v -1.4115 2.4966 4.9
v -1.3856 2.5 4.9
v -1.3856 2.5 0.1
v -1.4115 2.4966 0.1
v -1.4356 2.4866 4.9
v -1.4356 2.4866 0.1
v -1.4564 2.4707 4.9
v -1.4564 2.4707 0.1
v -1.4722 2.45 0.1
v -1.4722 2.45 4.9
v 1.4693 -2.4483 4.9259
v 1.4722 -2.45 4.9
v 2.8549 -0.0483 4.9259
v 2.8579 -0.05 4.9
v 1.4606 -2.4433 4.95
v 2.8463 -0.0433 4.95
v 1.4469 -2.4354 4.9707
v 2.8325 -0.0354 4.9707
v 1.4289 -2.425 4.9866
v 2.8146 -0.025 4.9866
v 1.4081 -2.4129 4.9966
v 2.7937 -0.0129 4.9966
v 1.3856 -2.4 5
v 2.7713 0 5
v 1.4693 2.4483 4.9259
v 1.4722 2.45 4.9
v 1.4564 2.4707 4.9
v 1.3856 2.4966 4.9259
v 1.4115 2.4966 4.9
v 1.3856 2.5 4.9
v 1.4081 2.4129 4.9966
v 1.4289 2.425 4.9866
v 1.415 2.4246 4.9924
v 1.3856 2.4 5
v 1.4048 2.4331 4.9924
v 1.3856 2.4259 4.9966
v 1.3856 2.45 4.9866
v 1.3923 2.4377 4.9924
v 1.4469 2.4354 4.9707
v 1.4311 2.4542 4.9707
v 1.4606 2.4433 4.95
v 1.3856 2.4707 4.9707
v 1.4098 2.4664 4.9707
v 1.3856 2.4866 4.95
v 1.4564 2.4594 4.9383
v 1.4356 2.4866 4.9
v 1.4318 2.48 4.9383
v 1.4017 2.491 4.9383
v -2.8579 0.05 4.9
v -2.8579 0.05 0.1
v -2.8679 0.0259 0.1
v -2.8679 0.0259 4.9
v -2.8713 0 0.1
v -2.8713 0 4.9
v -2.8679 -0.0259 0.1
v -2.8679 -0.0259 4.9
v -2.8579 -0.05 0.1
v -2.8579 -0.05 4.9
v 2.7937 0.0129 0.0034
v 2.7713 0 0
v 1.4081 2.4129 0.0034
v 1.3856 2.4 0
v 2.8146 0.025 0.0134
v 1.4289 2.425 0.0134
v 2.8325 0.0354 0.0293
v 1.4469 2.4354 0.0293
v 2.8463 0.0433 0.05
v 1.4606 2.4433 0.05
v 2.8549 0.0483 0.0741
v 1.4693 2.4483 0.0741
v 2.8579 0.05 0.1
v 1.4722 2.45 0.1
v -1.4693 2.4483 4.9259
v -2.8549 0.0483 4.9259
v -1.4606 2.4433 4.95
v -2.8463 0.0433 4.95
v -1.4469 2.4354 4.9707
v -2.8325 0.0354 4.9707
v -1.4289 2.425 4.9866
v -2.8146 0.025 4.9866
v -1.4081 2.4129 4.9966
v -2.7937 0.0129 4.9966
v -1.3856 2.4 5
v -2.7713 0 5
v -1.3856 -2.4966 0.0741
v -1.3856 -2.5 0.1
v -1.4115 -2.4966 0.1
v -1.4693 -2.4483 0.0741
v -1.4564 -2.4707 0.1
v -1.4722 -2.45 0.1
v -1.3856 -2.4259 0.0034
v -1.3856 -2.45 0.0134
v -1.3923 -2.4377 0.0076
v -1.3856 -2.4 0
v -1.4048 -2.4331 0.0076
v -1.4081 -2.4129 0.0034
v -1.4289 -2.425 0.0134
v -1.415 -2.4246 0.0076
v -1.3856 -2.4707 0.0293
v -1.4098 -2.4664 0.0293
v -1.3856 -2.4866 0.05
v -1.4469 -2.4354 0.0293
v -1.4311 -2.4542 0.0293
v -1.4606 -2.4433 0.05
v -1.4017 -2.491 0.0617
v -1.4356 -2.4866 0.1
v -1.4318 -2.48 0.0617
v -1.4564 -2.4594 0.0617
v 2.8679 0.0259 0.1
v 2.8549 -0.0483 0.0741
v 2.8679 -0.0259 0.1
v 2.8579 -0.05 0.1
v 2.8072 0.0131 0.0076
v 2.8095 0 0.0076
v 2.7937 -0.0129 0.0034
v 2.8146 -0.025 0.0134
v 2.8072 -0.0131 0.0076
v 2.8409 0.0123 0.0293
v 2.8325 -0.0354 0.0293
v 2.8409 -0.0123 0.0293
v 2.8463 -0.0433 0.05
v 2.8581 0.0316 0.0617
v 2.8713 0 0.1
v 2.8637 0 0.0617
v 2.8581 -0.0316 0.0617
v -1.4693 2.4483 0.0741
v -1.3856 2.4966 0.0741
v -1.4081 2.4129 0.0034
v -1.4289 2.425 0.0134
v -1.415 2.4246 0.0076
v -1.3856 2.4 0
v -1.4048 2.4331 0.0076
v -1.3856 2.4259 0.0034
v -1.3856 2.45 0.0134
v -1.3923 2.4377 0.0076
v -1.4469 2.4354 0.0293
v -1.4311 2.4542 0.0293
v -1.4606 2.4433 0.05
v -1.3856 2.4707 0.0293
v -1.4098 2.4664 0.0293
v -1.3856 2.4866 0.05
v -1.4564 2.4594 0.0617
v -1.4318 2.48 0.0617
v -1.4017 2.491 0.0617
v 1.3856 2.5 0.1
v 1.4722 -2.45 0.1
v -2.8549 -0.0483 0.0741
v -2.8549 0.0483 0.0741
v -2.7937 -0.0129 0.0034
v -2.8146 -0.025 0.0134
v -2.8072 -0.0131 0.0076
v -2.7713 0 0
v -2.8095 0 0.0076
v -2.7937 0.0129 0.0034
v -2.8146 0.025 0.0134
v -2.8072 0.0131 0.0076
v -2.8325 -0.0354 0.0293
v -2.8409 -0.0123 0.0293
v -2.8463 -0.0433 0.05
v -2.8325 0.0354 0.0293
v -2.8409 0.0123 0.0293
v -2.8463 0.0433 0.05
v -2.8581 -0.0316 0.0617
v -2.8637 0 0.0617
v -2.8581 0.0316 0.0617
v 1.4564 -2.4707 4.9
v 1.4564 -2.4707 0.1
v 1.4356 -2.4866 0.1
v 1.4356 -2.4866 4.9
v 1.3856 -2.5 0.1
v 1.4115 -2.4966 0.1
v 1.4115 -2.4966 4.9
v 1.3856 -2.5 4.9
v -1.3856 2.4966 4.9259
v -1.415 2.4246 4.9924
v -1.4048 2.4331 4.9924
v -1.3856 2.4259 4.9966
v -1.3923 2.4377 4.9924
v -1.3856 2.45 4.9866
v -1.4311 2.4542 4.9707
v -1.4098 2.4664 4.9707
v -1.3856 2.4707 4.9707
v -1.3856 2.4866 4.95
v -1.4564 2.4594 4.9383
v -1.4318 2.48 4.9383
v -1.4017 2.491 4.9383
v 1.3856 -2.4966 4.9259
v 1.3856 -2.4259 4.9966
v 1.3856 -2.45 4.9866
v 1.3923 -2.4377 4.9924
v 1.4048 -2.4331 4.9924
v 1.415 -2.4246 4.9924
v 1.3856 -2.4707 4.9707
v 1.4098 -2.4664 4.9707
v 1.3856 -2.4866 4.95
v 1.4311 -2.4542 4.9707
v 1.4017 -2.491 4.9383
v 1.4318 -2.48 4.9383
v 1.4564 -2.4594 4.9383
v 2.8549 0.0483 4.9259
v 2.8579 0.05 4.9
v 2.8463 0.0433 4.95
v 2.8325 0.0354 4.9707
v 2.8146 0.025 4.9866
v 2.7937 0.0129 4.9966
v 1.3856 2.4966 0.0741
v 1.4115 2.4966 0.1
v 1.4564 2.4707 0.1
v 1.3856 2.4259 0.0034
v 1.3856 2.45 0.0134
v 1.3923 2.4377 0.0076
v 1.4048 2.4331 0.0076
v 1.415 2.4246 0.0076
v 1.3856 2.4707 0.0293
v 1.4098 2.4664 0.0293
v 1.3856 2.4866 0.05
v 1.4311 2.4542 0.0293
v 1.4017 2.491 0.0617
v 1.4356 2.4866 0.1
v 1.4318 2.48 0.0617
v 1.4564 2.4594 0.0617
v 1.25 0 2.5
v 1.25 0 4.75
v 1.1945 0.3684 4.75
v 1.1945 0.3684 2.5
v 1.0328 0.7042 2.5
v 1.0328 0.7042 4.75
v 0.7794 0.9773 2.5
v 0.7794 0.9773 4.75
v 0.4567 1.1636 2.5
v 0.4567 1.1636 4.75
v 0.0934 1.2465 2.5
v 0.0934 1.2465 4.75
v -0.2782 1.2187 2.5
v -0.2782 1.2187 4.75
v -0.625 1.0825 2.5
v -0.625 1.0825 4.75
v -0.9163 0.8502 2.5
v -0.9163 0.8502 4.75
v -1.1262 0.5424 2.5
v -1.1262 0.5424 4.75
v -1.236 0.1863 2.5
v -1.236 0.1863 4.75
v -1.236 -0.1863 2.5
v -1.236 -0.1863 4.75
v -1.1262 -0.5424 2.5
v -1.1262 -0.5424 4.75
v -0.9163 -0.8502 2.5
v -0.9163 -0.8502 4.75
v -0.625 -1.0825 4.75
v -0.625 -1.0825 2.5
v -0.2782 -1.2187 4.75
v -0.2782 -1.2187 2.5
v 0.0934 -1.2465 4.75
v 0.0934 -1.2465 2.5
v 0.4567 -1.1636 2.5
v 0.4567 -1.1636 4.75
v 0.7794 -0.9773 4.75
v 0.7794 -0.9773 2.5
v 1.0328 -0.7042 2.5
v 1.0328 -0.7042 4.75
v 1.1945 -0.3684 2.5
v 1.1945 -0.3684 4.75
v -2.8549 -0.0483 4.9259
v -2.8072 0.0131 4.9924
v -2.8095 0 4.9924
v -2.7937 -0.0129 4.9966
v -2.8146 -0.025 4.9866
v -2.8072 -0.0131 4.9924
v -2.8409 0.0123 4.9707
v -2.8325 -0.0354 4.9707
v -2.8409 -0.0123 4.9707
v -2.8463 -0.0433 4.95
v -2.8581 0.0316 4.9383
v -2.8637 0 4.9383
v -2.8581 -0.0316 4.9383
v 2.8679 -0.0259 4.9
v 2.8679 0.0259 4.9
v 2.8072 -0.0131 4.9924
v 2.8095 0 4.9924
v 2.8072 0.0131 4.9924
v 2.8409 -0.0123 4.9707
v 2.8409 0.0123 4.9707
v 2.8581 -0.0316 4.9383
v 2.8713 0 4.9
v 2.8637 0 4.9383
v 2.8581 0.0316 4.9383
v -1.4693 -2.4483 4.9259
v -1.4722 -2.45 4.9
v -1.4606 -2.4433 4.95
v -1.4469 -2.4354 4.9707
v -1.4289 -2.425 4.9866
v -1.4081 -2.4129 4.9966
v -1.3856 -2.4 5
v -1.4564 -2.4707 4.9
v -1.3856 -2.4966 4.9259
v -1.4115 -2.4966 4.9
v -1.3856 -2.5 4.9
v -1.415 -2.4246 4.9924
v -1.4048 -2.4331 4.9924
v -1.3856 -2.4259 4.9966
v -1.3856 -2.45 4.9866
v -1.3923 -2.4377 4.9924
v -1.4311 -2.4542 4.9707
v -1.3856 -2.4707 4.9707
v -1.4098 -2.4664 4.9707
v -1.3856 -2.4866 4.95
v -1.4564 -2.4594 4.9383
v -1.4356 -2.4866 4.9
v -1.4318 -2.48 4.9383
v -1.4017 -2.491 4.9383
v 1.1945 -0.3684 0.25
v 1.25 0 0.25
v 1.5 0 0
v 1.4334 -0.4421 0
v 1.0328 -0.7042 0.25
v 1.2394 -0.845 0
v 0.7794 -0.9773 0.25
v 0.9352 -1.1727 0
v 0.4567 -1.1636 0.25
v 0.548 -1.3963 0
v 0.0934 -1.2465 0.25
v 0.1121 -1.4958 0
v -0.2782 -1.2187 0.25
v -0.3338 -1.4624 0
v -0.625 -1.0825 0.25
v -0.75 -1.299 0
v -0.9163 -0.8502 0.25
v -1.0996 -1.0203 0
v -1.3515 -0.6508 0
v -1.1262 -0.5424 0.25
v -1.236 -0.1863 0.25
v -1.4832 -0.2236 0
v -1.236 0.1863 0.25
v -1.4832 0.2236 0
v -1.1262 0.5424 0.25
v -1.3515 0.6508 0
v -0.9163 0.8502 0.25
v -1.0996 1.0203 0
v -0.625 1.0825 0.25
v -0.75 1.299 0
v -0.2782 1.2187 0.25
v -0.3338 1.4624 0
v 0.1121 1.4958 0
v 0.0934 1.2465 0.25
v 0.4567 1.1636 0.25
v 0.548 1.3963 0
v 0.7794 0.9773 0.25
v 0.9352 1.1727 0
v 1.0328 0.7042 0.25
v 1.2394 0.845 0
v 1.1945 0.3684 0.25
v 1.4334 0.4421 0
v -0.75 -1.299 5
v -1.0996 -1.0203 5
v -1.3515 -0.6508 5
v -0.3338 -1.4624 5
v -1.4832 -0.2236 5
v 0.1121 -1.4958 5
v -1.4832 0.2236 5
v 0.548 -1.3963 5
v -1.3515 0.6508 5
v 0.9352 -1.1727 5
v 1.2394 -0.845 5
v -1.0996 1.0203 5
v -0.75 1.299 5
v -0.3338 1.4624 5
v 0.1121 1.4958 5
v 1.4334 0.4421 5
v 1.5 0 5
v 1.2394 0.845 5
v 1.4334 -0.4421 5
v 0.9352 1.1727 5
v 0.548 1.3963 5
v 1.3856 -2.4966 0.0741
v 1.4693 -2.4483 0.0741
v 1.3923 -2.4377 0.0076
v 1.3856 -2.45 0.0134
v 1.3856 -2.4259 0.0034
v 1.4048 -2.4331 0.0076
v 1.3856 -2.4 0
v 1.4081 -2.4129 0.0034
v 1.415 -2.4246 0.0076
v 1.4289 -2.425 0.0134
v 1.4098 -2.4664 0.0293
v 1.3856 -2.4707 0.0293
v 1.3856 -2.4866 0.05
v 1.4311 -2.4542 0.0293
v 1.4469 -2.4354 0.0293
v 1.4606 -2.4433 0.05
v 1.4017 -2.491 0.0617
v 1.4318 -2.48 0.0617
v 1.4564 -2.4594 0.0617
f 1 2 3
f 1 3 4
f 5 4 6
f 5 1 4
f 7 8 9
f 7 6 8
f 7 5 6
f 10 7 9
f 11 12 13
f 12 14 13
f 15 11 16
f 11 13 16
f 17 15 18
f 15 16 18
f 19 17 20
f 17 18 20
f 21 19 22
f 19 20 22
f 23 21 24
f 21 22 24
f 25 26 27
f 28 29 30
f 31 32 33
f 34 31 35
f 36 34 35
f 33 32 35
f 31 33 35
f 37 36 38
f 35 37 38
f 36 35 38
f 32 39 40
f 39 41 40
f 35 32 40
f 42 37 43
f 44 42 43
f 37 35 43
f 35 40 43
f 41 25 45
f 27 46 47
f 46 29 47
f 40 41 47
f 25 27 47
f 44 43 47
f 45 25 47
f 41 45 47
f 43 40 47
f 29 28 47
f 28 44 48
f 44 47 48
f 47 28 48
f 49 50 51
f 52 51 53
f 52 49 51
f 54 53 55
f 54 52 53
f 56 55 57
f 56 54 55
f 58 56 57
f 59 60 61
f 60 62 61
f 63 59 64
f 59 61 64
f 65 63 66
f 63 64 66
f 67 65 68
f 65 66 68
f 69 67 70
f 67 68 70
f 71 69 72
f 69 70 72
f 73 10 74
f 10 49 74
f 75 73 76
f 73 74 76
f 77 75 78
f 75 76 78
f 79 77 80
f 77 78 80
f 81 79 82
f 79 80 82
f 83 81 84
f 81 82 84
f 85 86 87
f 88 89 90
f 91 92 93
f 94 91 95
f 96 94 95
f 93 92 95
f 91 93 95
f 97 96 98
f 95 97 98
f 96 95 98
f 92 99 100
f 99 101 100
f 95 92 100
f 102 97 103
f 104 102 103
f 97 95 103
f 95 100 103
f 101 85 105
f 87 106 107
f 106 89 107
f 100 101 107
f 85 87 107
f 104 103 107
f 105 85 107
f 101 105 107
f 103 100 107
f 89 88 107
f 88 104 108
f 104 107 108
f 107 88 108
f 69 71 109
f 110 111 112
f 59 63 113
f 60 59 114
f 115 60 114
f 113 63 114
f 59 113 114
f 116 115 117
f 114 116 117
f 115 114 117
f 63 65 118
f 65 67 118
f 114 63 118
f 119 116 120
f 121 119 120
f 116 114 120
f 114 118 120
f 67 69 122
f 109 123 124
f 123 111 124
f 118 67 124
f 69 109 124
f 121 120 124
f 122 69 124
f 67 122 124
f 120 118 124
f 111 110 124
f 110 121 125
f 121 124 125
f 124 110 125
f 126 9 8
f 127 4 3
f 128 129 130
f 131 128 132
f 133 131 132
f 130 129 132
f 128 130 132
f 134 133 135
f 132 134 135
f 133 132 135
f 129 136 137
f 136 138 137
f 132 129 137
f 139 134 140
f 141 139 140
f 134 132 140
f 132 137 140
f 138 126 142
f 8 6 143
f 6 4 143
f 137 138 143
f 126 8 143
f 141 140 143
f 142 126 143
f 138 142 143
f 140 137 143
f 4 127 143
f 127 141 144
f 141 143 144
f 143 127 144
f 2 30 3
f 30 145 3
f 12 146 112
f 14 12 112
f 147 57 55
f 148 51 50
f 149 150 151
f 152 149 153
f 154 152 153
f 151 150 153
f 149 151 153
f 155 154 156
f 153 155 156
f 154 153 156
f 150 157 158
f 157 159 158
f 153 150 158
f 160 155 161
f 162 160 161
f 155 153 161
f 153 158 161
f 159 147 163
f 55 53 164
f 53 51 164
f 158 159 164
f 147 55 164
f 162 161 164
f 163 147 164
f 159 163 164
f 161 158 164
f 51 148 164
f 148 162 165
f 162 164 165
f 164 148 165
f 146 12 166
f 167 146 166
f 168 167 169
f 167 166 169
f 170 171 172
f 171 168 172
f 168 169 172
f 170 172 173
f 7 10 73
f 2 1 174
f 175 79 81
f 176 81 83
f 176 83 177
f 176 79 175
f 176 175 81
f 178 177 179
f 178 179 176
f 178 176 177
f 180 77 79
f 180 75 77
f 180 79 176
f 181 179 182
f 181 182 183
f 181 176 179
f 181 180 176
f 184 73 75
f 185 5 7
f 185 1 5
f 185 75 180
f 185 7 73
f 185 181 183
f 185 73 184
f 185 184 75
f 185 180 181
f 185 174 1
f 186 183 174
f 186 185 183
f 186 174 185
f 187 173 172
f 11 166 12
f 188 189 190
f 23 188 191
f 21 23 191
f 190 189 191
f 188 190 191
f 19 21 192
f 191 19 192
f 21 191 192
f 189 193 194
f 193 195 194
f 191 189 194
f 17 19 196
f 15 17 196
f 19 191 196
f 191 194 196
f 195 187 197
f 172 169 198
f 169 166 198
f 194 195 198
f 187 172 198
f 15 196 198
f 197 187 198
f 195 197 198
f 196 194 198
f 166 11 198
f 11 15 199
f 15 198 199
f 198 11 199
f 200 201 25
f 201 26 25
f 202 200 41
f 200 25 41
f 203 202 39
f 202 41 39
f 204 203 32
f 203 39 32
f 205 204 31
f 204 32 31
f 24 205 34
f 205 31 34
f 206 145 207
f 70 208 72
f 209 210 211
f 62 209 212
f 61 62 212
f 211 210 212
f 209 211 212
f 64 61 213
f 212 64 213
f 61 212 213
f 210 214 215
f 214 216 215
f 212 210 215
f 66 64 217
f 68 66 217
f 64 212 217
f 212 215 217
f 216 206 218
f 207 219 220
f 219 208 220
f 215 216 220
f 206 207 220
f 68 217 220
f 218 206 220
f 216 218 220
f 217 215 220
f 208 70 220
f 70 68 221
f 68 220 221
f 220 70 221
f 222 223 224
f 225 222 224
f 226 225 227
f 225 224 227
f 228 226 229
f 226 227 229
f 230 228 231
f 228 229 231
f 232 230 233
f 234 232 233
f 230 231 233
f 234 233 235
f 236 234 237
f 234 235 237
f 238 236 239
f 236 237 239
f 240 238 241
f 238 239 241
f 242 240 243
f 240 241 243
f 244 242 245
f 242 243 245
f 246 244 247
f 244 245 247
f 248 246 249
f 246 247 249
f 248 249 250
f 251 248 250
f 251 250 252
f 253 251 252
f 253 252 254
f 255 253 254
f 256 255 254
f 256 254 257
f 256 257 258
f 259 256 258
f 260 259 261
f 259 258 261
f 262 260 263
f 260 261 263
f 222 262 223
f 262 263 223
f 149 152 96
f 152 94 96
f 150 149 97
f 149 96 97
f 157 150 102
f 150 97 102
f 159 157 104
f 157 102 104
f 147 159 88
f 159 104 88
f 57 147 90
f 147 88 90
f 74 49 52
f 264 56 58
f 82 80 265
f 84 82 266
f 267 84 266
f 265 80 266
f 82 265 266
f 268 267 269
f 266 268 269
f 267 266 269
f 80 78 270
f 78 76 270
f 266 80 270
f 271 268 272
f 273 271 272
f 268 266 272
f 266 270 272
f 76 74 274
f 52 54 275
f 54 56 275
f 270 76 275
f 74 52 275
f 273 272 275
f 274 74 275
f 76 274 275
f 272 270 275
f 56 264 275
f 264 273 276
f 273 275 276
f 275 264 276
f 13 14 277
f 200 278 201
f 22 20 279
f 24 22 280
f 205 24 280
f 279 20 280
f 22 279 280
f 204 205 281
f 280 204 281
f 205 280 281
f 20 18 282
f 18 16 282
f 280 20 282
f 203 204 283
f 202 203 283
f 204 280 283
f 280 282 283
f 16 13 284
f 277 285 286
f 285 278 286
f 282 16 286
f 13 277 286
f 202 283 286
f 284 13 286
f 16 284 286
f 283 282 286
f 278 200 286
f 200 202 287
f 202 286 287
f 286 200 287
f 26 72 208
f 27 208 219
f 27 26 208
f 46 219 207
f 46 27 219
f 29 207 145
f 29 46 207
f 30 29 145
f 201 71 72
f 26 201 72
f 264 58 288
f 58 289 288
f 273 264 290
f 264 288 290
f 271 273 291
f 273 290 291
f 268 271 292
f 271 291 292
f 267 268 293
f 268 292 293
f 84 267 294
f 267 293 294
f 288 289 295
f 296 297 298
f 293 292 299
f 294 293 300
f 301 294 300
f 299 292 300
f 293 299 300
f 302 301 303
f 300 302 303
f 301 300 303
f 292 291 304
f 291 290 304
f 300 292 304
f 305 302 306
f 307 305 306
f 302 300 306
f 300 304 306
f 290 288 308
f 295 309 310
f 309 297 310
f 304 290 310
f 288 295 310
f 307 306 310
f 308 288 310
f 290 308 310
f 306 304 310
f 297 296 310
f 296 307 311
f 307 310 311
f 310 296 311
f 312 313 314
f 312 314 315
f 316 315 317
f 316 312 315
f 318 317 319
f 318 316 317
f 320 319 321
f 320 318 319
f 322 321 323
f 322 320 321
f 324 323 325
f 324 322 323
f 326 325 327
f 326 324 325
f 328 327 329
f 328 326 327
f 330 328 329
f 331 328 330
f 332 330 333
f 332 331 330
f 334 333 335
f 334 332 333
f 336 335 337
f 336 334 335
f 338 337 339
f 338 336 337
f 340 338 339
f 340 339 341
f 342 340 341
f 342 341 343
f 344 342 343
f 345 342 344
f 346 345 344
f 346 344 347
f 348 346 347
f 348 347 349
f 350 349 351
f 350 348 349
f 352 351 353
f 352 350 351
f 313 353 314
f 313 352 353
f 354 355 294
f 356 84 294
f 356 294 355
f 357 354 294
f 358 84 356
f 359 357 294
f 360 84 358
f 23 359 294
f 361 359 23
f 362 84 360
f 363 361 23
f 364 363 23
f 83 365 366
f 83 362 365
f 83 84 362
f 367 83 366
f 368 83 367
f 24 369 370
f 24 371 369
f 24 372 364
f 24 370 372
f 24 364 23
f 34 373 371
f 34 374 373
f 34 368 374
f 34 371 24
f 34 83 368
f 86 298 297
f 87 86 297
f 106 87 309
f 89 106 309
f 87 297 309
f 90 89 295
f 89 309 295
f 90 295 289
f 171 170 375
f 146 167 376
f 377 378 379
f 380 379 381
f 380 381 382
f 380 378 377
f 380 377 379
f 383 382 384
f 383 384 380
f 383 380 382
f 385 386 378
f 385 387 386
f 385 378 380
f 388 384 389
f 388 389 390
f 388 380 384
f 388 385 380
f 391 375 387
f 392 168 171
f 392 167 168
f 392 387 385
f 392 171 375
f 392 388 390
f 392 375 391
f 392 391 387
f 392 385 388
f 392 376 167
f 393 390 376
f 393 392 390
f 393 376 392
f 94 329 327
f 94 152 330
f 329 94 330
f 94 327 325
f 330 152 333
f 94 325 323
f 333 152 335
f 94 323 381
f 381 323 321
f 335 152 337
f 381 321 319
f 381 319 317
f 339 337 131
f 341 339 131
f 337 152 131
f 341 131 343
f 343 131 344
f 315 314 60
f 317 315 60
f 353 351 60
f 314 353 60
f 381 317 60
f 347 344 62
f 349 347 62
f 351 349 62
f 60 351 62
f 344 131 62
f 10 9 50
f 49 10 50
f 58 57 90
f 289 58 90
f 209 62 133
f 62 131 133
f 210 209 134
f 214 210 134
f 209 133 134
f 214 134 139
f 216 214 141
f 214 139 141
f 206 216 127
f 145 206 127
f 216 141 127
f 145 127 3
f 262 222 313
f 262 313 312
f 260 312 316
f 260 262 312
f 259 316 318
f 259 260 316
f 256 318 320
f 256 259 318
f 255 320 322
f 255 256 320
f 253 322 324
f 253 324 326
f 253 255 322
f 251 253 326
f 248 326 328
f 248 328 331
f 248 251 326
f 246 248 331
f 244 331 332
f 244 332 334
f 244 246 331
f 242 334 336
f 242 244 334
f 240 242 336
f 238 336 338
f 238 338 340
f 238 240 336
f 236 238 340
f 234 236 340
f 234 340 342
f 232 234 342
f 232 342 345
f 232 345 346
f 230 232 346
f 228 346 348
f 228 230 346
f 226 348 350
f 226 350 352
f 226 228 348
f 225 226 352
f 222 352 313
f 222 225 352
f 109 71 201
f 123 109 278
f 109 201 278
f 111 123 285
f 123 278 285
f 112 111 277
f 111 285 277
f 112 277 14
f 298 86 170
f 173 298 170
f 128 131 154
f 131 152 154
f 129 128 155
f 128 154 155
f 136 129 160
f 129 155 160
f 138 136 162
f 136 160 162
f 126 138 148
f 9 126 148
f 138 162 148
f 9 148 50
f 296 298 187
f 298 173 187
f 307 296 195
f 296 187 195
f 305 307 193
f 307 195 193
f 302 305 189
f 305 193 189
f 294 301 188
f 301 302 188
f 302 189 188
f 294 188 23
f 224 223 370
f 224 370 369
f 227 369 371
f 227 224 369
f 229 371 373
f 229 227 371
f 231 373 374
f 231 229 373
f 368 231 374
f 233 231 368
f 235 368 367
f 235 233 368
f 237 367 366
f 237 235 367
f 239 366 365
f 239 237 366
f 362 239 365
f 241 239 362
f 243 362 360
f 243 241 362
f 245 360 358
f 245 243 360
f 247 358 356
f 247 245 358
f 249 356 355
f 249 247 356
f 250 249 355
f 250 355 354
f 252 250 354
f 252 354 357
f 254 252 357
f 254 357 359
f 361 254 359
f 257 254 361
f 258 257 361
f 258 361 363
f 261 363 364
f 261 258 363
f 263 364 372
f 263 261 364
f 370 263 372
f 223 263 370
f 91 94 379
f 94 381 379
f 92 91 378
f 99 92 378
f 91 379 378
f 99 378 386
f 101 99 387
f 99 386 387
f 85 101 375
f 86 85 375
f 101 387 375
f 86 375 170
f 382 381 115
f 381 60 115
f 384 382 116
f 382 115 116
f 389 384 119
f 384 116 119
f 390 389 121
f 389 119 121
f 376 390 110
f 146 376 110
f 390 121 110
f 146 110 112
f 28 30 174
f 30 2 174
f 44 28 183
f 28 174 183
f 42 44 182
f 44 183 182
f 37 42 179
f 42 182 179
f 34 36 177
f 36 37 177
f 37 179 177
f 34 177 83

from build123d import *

# Parameters (mm, degrees)
EXTRUDE_1_DEPTH     = 5
SKETCH_2_R          = 1.25
CUT_EXTRUDE_1_DEPTH = 2.5
CUT_EXTRUDE_START   = -2.5
SKETCH_3_R          = 1.25
CUT_EXTRUDE_2_DEPTH = 2.5
CHAMFER_1_SIZE      = 0.25
FILLET_1_R          = 0.1


with BuildPart() as part:
    # Эскиз1 → Бобышка-Вытянуть1 (new body)
    with BuildSketch(Plane.XY):
        Polygon((2.886751346, 0), (1.443375673, 2.5), (-1.443375673, 2.5), (-2.886751346, 0), (-1.443375673, -2.5), (1.443375673, -2.5), align=None)
    extrude(amount=EXTRUDE_1_DEPTH)

    # Эскиз2 → Вырез-Вытянуть1 (cut)
    with BuildSketch(Plane.XY.offset(5)):
        Circle(SKETCH_2_R)
    extrude(amount=-CUT_EXTRUDE_1_DEPTH, mode=Mode.SUBTRACT)

    # Эскиз3 → Вырез-Вытянуть2 (cut)
    with BuildSketch(Plane(origin=(0, 0, 0), x_dir=(-1, 0, 0), z_dir=(0, 0, -1)).offset(CUT_EXTRUDE_START)):
        with Locations(Location((0, 0, 0), (0, 0, 180))):
            Circle(SKETCH_3_R)
    extrude(amount=CUT_EXTRUDE_2_DEPTH, mode=Mode.SUBTRACT)

    # Фаска1
    chamfer_1_edges = [part.edges().sort_by_distance(p)[0] for p in [
        (-1.25, 0, 5),
        (-1.25, 0, 0),
    ]]
    chamfer(chamfer_1_edges, length=CHAMFER_1_SIZE)

    # Скругление1
    fillet_1_edges = [part.edges().sort_by_distance(p)[0] for p in [
        (0, 2.5, 5),
        (1.443375673, -2.5, 2.5),
        (-1.443375673, -2.5, 2.5),
        (-2.886751346, 0, 2.5),
        (-1.443375673, 2.5, 2.5),
        (1.443375673, 2.5, 2.5),
        (2.886751346, 0, 2.5),
        (-2.165063509, 1.25, 5),
        (-2.165063509, -1.25, 5),
        (0, -2.5, 5),
        (2.165063509, -1.25, 5),
        (0, -2.5, 0),
        (-2.165063509, -1.25, 0),
        (-2.165063509, 1.25, 0),
        (2.165063509, 1.25, 5),
        (0, 2.5, 0),
        (2.165063509, 1.25, 0),
        (2.165063509, -1.25, 0),
    ]]
    fillet(fillet_1_edges, radius=FILLET_1_R)


solid = part.part
